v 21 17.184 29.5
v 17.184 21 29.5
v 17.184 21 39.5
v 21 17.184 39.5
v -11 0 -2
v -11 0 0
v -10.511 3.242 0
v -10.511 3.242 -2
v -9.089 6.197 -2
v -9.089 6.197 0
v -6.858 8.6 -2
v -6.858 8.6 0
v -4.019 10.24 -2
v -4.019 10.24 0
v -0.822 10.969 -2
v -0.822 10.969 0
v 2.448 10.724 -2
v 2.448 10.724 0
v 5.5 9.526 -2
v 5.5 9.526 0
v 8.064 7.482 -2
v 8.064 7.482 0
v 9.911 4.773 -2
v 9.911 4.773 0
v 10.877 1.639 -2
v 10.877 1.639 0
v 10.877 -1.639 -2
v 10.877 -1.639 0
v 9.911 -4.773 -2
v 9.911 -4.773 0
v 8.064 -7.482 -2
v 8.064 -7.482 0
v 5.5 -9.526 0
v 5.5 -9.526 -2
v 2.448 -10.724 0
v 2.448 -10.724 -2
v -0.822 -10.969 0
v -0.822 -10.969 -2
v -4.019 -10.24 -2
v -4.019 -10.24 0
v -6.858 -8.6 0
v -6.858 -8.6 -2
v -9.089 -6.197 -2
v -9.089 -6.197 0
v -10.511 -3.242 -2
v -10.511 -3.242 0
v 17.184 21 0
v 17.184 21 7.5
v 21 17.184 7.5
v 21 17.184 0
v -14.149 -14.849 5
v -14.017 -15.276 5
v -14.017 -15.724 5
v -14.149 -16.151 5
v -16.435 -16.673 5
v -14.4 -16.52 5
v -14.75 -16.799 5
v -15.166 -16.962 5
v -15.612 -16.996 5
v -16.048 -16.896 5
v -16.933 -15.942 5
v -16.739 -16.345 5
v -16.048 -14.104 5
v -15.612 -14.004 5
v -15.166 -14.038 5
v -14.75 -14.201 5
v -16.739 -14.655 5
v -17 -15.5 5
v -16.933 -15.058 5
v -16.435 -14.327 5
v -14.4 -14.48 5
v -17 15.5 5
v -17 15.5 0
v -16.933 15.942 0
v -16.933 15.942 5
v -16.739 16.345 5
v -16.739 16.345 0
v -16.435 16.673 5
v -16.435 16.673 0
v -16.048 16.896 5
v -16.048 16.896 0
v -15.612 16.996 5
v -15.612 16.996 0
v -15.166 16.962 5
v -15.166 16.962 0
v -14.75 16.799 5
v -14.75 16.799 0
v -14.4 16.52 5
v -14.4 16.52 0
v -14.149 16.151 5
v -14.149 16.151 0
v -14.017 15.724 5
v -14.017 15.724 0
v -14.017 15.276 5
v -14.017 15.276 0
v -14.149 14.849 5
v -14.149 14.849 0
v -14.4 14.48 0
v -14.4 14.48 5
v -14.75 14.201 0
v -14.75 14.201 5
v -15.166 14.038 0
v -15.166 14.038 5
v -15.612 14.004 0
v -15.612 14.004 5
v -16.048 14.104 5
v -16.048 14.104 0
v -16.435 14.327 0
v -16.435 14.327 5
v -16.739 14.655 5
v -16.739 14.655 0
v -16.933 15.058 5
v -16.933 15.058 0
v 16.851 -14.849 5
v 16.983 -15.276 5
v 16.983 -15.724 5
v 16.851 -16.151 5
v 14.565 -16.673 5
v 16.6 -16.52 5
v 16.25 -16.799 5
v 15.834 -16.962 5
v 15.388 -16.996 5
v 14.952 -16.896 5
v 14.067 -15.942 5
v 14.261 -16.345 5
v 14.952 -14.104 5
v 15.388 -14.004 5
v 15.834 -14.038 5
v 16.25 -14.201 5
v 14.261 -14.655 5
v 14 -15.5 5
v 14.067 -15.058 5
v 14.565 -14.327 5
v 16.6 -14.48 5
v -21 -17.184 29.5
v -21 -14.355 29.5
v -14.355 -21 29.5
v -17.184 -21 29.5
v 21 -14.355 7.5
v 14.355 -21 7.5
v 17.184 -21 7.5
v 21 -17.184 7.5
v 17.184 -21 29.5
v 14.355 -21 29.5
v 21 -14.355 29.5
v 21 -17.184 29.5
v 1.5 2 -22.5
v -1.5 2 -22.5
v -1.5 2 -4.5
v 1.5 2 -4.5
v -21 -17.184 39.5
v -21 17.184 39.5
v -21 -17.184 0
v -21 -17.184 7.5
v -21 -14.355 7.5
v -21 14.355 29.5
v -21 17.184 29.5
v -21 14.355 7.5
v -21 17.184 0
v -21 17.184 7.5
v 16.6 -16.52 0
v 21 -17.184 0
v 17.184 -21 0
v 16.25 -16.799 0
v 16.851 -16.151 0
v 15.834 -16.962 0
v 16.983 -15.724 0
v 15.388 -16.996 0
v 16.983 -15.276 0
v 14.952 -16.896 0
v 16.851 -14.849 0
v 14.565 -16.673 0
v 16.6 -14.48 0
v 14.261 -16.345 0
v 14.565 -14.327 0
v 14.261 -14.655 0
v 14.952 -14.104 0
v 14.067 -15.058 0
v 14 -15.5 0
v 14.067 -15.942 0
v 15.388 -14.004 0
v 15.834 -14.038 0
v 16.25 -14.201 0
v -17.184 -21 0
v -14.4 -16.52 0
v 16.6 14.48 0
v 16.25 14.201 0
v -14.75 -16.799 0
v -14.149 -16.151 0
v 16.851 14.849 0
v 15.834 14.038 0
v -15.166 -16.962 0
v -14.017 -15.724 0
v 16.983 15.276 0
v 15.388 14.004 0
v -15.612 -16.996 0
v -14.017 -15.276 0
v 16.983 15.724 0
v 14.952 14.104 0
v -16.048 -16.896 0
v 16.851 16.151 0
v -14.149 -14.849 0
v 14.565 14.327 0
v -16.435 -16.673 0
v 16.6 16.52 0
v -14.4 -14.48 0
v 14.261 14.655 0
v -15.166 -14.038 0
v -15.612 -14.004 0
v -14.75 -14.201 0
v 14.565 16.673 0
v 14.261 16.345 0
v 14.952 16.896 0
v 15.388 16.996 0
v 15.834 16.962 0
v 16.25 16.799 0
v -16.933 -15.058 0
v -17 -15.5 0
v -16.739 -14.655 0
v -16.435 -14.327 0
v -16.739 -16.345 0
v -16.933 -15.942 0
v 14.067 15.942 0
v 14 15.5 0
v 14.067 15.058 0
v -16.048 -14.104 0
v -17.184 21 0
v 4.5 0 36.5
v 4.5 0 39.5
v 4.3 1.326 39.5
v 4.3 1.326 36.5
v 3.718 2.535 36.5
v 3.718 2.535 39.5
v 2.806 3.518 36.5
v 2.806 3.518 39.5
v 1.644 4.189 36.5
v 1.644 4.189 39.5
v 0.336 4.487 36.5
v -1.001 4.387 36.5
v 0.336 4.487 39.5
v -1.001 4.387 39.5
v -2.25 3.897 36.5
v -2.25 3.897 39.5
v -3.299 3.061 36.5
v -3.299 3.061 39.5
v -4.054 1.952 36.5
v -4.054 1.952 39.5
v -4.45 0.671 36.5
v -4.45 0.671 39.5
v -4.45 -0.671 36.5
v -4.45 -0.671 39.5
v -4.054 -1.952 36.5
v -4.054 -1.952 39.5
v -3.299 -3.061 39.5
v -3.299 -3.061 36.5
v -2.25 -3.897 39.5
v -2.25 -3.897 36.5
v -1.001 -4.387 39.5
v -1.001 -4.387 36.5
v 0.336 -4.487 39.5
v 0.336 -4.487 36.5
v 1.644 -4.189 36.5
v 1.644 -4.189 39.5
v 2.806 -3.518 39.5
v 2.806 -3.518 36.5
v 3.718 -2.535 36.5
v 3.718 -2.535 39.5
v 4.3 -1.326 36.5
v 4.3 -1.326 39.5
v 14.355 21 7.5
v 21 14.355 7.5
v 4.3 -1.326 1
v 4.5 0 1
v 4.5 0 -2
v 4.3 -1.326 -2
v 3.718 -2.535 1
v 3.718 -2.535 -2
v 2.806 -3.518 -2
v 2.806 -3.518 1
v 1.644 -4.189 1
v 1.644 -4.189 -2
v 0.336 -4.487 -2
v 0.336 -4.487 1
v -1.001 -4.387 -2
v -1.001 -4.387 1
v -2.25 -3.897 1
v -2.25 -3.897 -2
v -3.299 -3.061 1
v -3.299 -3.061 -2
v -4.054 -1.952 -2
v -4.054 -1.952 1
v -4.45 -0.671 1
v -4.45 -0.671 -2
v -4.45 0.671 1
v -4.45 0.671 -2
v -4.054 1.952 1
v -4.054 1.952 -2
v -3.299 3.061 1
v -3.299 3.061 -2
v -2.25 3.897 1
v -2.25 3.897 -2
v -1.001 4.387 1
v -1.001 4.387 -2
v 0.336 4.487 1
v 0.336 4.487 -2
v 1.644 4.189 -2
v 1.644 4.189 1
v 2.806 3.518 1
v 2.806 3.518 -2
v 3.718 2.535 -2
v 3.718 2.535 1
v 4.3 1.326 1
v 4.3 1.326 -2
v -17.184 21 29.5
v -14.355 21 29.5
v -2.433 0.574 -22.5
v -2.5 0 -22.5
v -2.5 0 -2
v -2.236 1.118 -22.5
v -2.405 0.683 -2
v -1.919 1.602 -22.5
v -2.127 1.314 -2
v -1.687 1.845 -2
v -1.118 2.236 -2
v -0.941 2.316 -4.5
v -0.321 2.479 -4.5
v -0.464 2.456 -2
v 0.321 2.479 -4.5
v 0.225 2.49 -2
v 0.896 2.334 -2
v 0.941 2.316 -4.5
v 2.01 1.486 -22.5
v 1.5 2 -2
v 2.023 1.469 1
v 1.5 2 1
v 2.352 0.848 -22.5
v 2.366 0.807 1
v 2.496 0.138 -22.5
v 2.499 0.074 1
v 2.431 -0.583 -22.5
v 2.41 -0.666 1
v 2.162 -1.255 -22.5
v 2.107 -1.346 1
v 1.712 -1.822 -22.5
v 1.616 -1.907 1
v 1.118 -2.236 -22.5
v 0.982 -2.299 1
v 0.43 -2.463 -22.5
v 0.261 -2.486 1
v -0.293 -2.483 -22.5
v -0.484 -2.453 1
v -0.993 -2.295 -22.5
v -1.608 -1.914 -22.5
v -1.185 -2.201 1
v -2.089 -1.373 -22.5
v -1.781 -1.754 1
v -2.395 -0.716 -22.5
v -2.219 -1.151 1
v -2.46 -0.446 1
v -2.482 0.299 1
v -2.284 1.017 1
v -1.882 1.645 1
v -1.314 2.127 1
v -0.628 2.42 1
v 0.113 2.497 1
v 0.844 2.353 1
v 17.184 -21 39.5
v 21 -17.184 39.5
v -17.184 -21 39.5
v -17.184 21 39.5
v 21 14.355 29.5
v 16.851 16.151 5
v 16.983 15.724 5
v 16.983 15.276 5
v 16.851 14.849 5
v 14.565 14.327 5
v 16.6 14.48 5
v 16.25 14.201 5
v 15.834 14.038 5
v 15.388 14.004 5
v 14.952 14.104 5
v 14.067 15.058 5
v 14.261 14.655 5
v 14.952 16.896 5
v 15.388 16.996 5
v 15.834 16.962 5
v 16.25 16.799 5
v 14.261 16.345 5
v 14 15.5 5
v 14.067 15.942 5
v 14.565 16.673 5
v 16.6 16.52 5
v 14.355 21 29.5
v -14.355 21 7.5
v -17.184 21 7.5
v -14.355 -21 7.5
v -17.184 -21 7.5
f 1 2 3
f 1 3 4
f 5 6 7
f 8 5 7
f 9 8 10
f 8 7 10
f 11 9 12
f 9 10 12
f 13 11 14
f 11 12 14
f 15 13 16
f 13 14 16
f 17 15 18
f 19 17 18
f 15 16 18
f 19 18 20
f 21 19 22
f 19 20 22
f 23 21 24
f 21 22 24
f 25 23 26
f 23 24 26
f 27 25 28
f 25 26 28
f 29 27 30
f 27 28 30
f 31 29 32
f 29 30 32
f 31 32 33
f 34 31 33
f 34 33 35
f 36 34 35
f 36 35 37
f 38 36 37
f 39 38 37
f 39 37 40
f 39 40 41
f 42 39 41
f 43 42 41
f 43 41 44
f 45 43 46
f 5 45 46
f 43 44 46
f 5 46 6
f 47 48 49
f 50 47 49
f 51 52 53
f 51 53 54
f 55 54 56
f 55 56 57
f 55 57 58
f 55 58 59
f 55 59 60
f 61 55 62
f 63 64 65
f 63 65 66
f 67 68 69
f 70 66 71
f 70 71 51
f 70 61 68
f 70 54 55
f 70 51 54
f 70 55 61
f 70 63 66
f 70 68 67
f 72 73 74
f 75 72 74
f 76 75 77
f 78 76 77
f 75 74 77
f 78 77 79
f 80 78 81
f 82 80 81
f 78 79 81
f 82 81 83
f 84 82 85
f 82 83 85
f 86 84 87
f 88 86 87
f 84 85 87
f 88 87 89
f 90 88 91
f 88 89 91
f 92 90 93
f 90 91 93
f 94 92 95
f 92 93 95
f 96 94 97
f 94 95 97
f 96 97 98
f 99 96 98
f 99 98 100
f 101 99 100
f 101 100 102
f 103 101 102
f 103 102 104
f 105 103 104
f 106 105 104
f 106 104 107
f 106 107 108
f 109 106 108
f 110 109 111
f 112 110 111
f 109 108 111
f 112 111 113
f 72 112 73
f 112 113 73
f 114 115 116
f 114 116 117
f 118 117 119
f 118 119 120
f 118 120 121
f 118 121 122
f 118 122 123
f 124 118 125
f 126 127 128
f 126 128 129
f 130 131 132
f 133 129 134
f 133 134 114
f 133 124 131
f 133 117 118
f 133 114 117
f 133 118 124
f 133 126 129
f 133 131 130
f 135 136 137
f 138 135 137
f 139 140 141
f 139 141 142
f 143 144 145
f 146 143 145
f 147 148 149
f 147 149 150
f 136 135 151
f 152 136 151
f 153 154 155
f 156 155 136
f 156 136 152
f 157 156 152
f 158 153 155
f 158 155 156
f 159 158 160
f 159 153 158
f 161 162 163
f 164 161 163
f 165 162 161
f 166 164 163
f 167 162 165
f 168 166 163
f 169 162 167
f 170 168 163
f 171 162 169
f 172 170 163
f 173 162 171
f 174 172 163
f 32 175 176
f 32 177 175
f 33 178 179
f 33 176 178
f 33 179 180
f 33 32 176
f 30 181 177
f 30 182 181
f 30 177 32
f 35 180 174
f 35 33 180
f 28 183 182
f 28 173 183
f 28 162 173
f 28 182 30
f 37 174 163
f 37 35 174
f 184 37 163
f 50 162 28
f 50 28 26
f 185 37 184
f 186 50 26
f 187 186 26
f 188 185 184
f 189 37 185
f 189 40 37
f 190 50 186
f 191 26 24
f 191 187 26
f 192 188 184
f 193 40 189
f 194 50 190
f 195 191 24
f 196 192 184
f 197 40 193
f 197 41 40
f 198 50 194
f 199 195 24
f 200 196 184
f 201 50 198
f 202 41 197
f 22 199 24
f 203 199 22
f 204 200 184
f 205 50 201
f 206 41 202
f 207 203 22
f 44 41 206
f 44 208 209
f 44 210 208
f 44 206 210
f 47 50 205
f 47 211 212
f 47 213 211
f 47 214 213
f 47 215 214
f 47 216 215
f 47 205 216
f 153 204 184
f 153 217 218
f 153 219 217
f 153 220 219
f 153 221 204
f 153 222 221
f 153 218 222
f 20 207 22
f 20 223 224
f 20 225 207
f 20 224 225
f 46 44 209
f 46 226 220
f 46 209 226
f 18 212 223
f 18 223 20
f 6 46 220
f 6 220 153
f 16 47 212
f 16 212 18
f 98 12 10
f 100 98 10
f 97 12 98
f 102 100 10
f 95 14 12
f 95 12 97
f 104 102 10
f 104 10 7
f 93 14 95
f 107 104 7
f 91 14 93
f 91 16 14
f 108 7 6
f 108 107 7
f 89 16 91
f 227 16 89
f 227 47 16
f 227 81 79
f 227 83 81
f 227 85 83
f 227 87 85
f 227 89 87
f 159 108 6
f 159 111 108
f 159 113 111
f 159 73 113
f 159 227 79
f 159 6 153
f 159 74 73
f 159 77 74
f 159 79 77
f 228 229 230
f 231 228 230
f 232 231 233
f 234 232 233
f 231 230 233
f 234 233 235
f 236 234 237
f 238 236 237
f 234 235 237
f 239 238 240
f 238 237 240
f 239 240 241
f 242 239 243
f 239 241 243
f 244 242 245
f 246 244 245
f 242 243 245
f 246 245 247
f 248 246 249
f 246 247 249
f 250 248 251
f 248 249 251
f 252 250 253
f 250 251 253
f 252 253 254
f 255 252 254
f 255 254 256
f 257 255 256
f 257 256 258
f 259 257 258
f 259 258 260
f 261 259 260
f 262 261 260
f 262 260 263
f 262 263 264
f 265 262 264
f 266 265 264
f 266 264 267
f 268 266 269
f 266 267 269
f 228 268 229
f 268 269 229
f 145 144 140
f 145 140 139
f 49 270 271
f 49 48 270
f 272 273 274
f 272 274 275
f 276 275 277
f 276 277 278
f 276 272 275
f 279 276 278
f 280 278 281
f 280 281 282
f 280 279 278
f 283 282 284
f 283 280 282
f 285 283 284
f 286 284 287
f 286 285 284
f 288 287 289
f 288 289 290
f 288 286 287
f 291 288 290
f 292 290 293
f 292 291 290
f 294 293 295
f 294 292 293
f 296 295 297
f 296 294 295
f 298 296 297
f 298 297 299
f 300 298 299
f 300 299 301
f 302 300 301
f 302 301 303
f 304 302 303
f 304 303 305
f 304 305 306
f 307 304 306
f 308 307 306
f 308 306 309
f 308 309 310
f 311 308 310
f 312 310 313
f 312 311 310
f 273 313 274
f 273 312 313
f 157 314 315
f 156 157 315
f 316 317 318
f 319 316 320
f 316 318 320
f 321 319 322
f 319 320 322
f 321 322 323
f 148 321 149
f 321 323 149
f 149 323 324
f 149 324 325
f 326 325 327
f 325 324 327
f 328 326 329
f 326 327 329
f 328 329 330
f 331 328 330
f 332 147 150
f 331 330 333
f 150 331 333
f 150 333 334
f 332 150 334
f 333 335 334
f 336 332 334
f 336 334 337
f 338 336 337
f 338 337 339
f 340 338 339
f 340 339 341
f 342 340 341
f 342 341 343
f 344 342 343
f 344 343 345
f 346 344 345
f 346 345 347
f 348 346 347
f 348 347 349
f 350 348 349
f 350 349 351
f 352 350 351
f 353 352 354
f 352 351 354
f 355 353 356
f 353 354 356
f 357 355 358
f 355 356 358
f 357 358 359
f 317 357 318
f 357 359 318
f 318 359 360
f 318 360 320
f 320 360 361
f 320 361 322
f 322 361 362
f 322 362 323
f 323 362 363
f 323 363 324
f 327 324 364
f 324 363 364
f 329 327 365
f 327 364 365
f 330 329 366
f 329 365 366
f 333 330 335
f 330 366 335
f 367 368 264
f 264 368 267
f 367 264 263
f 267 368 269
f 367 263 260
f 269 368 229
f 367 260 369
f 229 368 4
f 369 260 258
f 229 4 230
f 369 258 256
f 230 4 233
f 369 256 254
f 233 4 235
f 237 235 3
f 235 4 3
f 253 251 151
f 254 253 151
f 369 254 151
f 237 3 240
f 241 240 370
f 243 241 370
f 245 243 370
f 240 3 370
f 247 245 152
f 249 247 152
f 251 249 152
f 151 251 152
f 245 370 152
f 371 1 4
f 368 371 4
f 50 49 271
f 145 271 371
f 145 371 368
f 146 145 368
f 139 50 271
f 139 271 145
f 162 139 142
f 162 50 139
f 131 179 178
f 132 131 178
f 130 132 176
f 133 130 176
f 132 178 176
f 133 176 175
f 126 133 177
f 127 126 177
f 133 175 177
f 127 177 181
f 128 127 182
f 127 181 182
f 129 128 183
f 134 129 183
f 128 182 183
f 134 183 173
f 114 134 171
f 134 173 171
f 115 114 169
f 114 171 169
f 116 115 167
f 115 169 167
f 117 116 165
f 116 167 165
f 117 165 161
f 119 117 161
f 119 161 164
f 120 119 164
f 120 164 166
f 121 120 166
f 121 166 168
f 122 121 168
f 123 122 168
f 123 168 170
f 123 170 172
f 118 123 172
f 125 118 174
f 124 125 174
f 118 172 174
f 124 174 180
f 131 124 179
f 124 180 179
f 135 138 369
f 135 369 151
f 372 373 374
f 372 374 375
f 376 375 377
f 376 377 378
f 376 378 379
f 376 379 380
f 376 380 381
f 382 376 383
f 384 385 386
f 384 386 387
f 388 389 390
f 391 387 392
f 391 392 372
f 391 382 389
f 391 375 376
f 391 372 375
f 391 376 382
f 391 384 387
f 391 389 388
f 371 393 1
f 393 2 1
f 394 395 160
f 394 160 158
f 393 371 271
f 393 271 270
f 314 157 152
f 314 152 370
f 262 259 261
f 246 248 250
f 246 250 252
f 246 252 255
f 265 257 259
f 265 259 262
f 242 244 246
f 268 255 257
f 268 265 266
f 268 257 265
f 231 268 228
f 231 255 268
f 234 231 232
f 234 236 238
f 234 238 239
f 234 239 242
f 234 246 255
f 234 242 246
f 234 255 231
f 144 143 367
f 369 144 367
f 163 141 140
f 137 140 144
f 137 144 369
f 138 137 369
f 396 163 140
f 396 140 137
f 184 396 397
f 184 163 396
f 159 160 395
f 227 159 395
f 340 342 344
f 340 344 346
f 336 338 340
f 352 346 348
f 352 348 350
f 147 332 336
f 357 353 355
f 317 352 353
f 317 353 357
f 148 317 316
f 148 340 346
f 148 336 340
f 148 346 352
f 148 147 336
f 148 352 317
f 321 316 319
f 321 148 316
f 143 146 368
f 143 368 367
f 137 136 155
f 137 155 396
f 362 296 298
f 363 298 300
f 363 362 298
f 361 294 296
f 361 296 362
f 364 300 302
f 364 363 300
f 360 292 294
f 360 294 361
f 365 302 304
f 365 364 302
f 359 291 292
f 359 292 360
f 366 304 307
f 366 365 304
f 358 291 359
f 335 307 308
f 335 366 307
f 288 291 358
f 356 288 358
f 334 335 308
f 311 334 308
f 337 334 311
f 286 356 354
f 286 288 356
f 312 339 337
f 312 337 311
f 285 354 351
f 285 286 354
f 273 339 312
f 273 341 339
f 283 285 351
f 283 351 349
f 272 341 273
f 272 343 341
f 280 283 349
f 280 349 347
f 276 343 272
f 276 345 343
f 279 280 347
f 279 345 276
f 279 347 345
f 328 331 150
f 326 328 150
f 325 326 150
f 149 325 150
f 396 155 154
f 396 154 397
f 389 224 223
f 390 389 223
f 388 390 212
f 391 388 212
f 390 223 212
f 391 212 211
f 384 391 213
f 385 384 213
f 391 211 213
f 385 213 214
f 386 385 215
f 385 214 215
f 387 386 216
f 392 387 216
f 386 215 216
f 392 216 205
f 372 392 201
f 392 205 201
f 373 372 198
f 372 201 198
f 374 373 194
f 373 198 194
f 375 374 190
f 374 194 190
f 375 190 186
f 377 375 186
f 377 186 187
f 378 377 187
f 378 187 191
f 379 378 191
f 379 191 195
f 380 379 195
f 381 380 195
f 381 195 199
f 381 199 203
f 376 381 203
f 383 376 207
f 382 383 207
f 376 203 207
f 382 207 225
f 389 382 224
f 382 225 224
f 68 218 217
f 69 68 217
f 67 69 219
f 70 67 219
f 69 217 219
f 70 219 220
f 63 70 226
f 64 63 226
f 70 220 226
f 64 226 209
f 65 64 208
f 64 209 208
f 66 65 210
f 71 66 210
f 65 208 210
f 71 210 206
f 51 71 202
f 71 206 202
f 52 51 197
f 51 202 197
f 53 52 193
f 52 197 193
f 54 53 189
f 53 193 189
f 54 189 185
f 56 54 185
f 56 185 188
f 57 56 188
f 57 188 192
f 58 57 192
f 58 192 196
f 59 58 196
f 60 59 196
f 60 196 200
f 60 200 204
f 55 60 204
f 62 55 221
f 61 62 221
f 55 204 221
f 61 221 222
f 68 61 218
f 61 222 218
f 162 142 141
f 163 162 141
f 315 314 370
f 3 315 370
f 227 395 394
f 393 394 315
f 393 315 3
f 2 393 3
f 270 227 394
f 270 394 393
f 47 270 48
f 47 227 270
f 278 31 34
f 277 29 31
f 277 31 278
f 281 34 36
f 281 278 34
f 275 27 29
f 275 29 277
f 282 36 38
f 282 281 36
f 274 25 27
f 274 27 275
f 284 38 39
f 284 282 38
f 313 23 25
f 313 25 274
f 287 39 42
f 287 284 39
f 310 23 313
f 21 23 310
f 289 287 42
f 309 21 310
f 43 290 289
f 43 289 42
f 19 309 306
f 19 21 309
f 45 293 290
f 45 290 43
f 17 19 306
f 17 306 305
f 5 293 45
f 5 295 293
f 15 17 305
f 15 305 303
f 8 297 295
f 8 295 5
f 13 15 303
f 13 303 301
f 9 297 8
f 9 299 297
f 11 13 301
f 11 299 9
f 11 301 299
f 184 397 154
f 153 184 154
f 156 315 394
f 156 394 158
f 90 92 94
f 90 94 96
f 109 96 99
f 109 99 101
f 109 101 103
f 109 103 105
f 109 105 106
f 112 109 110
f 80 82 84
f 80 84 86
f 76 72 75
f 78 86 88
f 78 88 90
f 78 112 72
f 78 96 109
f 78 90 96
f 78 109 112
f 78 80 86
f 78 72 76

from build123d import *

# Parameters (mm, degrees)
EXTRUDE_1_DEPTH     = 39.5
SKETCH_2_R          = 11
EXTRUDE_2_DEPTH     = 2
SKETCH_3_R          = 2.5
EXTRUDE_3_DEPTH     = 20.5
SKETCH_4_R          = 1.5
CUT_EXTRUDE_1_DEPTH = 5
CUT_EXTRUDE_START   = -18
CUT_EXTRUDE_2_DEPTH = 18
SKETCH_6_R          = 4.5
CUT_EXTRUDE_3_DEPTH = 3
CUT_EXTRUDE_START_2 = -3
SKETCH_7_R          = 4.5
SKETCH_7_R_2        = 2.5
CUT_EXTRUDE_4_DEPTH = 3
SKETCH_8_W          = 61.801157568
SKETCH_8_H          = 60.217907666
CUT_EXTRUDE_5_DEPTH = 22


with BuildPart() as part:
    # 草图1 → 凸台-拉伸1 (new body)
    with BuildSketch(Plane.XY):
        Polygon((-17.183766184, 21), (17.183766184, 21), (21, 17.183766184), (21, -17.183766184), (17.183766184, -21), (-17.183766184, -21), (-21, -17.183766184), (-21, 17.183766184), align=None)
    extrude(amount=EXTRUDE_1_DEPTH)

    # 草图2 → 凸台-拉伸2 (add)
    with BuildSketch(Plane(origin=(0, 0, 0), x_dir=(-1, 0, 0), z_dir=(0, 0, -1))):
        Circle(SKETCH_2_R)
    extrude(amount=EXTRUDE_2_DEPTH)

    # 草图3 → 凸台-拉伸3 (add)
    with BuildSketch(Plane(origin=(0, 0, -2), x_dir=(-1, 0, 0), z_dir=(0, 0, -1))):
        Circle(SKETCH_3_R)
    extrude(amount=EXTRUDE_3_DEPTH)

    # 草图4 → 切除-拉伸1 (cut)
    with BuildSketch(Plane(origin=(0, 0, 0), x_dir=(-1, 0, 0), z_dir=(0, 0, -1))):
        with Locations((-15.5, -15.5)):
            Circle(SKETCH_4_R)
        with Locations((-15.5, 15.5)):
            Circle(SKETCH_4_R)
        with Locations((15.5, 15.5)):
            Circle(SKETCH_4_R)
        with Locations((15.5, -15.5)):
            Circle(SKETCH_4_R)
    extrude(amount=-CUT_EXTRUDE_1_DEPTH, mode=Mode.SUBTRACT)

    # 草图5 → 切除-拉伸2 (cut)
    with BuildSketch(Plane(origin=(0, 0, -22.5), x_dir=(-1, 0, 0), z_dir=(0, 0, -1)).offset(CUT_EXTRUDE_START)):
        with BuildLine():
            Line((1.5, 2), (-1.5, 2))
            ThreePointArc((-1.5, 2), (0, 2.5), (1.5, 2))
        make_face()
    extrude(amount=CUT_EXTRUDE_2_DEPTH, mode=Mode.SUBTRACT)

    # 草图6 → 切除-拉伸3 (cut)
    with BuildSketch(Plane.XY.offset(39.5)):
        Circle(SKETCH_6_R)
    extrude(amount=-CUT_EXTRUDE_3_DEPTH, mode=Mode.SUBTRACT)

    # 草图7 → 切除-拉伸4 (cut)
    with BuildSketch(Plane(origin=(0, 0, -2), x_dir=(-1, 0, 0), z_dir=(0, 0, -1)).offset(CUT_EXTRUDE_START_2)):
        with Locations(Location((0, 0, 0), (0, 0, 180))):
            Circle(SKETCH_7_R)
        with Locations(Location((0, 0, 0), (0, 0, 126.869897646))):
            Circle(SKETCH_7_R_2, mode=Mode.SUBTRACT)
    extrude(amount=CUT_EXTRUDE_4_DEPTH, mode=Mode.SUBTRACT)

    # 草图8 → 切除-拉伸5 (cut)
    with BuildSketch(Plane.XY.offset(29.5)):
        Rectangle(SKETCH_8_W, SKETCH_8_H)
        Polygon((21, -14.355339059), (21, 14.355339059), (14.355339059, 21), (-14.355339059, 21), (-21, 14.355339059), (-21, -14.355339059), (-14.355339059, -21), (14.355339059, -21), align=None, mode=Mode.SUBTRACT)
    extrude(amount=-CUT_EXTRUDE_5_DEPTH, mode=Mode.SUBTRACT)


solid = part.part
